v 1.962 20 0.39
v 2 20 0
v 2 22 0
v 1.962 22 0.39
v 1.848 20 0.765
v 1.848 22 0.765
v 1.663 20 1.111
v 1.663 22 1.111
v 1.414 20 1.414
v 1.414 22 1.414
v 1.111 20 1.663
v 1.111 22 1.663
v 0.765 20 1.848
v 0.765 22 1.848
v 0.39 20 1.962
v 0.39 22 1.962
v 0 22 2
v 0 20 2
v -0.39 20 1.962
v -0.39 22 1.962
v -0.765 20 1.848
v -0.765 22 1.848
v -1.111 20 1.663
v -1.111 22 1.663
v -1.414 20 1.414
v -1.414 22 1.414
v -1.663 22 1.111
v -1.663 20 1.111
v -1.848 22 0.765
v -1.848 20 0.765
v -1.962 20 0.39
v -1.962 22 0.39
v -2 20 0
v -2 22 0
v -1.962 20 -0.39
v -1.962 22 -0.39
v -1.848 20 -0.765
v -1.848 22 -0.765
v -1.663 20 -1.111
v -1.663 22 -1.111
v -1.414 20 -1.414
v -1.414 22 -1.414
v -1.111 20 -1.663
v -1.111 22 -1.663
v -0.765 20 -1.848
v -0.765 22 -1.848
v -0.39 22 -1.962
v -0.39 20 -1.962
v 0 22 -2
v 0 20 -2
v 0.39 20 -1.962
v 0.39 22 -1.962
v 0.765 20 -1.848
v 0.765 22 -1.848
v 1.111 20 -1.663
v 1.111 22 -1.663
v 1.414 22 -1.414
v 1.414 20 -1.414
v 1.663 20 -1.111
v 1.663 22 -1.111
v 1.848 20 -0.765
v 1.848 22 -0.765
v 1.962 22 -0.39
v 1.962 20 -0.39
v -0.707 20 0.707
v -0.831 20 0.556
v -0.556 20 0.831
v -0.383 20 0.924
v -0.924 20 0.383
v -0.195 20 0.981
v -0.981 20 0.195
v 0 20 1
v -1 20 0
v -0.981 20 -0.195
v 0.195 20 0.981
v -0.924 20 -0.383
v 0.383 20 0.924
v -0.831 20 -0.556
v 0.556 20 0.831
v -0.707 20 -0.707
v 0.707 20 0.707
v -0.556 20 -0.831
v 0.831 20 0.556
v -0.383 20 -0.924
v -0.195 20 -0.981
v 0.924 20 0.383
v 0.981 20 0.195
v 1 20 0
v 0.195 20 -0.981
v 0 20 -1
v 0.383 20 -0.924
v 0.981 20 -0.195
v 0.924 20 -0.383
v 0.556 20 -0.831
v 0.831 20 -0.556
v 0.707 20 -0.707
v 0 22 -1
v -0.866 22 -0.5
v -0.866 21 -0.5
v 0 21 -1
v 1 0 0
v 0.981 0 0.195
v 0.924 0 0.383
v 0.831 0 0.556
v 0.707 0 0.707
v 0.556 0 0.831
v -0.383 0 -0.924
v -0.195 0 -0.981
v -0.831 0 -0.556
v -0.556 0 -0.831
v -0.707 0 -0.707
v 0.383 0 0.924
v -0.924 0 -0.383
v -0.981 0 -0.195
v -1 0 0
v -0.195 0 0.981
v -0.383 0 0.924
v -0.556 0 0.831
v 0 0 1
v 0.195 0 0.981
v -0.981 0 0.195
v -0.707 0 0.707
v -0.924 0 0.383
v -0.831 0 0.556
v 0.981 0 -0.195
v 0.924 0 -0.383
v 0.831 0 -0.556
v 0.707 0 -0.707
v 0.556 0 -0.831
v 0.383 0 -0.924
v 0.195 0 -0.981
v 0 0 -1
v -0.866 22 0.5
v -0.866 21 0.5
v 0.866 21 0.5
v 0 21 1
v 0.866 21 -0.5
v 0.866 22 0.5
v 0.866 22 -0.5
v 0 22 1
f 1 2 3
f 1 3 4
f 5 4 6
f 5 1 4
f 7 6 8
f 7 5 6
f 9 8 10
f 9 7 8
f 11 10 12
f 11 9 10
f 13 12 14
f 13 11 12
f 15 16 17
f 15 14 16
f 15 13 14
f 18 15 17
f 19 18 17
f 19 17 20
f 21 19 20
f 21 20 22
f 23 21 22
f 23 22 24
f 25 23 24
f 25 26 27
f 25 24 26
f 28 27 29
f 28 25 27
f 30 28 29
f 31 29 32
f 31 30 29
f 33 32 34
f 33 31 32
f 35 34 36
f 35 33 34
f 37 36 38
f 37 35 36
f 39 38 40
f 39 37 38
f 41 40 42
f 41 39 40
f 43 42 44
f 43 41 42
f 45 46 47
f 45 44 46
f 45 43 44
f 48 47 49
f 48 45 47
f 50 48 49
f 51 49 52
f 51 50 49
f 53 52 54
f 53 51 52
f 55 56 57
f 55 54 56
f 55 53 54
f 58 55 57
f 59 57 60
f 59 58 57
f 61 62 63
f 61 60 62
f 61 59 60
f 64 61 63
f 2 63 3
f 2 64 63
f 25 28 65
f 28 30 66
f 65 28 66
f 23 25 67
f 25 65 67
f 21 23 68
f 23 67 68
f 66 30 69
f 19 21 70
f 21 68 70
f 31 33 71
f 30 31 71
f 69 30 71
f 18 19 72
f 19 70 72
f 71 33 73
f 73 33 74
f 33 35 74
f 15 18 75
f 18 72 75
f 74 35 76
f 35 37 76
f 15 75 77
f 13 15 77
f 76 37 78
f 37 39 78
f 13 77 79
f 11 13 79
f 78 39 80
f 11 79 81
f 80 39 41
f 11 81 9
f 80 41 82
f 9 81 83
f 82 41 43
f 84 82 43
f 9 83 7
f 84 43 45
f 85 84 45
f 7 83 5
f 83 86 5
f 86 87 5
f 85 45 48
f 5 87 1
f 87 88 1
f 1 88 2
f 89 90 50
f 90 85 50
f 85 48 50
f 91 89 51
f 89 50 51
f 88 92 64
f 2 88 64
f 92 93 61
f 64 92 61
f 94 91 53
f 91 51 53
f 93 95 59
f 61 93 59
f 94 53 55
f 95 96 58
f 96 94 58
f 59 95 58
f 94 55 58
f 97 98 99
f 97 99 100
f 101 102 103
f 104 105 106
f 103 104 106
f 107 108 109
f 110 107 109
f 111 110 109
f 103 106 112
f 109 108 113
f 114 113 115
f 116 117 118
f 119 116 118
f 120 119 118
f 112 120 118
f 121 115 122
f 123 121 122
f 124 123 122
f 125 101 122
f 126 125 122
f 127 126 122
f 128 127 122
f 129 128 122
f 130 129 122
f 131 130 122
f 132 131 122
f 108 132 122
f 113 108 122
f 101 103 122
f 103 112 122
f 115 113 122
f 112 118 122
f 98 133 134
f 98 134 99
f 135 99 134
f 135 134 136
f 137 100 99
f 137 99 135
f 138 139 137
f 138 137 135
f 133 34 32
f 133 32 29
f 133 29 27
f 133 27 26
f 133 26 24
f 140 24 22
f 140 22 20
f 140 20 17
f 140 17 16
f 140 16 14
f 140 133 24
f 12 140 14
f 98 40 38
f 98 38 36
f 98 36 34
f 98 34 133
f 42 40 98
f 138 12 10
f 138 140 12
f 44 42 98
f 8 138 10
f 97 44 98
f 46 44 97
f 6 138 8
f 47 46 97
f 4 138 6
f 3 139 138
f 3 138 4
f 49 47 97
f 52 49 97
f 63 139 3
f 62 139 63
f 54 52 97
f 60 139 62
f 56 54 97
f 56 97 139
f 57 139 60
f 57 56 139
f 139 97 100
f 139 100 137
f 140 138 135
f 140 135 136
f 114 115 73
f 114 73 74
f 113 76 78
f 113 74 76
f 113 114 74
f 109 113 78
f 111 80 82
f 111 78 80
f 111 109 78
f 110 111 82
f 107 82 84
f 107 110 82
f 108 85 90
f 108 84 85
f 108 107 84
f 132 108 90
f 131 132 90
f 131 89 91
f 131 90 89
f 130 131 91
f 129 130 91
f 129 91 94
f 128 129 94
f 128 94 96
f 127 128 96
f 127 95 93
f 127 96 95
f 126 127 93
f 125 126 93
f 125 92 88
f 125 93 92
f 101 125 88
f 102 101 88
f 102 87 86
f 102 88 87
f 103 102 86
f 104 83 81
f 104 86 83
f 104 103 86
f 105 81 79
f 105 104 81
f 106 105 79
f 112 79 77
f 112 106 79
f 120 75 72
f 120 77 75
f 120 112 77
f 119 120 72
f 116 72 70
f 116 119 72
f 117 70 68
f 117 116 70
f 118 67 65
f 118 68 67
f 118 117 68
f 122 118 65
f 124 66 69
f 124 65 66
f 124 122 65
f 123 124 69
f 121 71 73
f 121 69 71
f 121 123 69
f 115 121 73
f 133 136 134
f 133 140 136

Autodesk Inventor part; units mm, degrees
ref_plane "YZ Plane" through (0, 0, 0) normal (1, 0, 0) x (0, 1, 0)
ref_plane "XZ Plane" through (0, 0, 0) normal (0, 1, 0) x (-1, 0, 0)
ref_plane "XY Plane" through (0, 0, 0) normal (0, 0, 1) x (1, 0, 0)
sketch "Sketch1" plane through (0, 0, 0) normal (0, 1, 0) x (-1, 0, 0)
  circle A0 centre (0, 0) radius 1
  dimension "d0" = 2
extrude "Extrusion1" add sketch "Sketch1" along normal blind 20
sketch "Sketch2" plane through (0, 20, 0) normal (0, 1, 0) x (1, 0, 0)
  circle A0 centre (0, 0) radius 2
  dimension "d3" = 4
extrude "Extrusion2" add sketch "Sketch2" along normal blind 2
sketch "Sketch3" plane through (0, 22, 0) normal (0, 1, 0) x (1, 0, 0)
  circle A0 centre (0, 0) radius 1 projected
  line L0 (0, 1) -> (0.866, 0.5)
  line L1 (0.866, 0.5) -> (0.866, -0.5)
  line L2 (0.866, -0.5) -> (0, -1)
  line L3 (0, -1) -> (-0.866, -0.5)
  line L4 (-0.866, -0.5) -> (-0.866, 0.5)
  line L5 (-0.866, 0.5) -> (0, 1)
extrude "Extrusion3" cut sketch "Sketch3" against normal blind 1 contours L1 L2 L3 L4 L5 L0
properties part number "M2_bolt"
